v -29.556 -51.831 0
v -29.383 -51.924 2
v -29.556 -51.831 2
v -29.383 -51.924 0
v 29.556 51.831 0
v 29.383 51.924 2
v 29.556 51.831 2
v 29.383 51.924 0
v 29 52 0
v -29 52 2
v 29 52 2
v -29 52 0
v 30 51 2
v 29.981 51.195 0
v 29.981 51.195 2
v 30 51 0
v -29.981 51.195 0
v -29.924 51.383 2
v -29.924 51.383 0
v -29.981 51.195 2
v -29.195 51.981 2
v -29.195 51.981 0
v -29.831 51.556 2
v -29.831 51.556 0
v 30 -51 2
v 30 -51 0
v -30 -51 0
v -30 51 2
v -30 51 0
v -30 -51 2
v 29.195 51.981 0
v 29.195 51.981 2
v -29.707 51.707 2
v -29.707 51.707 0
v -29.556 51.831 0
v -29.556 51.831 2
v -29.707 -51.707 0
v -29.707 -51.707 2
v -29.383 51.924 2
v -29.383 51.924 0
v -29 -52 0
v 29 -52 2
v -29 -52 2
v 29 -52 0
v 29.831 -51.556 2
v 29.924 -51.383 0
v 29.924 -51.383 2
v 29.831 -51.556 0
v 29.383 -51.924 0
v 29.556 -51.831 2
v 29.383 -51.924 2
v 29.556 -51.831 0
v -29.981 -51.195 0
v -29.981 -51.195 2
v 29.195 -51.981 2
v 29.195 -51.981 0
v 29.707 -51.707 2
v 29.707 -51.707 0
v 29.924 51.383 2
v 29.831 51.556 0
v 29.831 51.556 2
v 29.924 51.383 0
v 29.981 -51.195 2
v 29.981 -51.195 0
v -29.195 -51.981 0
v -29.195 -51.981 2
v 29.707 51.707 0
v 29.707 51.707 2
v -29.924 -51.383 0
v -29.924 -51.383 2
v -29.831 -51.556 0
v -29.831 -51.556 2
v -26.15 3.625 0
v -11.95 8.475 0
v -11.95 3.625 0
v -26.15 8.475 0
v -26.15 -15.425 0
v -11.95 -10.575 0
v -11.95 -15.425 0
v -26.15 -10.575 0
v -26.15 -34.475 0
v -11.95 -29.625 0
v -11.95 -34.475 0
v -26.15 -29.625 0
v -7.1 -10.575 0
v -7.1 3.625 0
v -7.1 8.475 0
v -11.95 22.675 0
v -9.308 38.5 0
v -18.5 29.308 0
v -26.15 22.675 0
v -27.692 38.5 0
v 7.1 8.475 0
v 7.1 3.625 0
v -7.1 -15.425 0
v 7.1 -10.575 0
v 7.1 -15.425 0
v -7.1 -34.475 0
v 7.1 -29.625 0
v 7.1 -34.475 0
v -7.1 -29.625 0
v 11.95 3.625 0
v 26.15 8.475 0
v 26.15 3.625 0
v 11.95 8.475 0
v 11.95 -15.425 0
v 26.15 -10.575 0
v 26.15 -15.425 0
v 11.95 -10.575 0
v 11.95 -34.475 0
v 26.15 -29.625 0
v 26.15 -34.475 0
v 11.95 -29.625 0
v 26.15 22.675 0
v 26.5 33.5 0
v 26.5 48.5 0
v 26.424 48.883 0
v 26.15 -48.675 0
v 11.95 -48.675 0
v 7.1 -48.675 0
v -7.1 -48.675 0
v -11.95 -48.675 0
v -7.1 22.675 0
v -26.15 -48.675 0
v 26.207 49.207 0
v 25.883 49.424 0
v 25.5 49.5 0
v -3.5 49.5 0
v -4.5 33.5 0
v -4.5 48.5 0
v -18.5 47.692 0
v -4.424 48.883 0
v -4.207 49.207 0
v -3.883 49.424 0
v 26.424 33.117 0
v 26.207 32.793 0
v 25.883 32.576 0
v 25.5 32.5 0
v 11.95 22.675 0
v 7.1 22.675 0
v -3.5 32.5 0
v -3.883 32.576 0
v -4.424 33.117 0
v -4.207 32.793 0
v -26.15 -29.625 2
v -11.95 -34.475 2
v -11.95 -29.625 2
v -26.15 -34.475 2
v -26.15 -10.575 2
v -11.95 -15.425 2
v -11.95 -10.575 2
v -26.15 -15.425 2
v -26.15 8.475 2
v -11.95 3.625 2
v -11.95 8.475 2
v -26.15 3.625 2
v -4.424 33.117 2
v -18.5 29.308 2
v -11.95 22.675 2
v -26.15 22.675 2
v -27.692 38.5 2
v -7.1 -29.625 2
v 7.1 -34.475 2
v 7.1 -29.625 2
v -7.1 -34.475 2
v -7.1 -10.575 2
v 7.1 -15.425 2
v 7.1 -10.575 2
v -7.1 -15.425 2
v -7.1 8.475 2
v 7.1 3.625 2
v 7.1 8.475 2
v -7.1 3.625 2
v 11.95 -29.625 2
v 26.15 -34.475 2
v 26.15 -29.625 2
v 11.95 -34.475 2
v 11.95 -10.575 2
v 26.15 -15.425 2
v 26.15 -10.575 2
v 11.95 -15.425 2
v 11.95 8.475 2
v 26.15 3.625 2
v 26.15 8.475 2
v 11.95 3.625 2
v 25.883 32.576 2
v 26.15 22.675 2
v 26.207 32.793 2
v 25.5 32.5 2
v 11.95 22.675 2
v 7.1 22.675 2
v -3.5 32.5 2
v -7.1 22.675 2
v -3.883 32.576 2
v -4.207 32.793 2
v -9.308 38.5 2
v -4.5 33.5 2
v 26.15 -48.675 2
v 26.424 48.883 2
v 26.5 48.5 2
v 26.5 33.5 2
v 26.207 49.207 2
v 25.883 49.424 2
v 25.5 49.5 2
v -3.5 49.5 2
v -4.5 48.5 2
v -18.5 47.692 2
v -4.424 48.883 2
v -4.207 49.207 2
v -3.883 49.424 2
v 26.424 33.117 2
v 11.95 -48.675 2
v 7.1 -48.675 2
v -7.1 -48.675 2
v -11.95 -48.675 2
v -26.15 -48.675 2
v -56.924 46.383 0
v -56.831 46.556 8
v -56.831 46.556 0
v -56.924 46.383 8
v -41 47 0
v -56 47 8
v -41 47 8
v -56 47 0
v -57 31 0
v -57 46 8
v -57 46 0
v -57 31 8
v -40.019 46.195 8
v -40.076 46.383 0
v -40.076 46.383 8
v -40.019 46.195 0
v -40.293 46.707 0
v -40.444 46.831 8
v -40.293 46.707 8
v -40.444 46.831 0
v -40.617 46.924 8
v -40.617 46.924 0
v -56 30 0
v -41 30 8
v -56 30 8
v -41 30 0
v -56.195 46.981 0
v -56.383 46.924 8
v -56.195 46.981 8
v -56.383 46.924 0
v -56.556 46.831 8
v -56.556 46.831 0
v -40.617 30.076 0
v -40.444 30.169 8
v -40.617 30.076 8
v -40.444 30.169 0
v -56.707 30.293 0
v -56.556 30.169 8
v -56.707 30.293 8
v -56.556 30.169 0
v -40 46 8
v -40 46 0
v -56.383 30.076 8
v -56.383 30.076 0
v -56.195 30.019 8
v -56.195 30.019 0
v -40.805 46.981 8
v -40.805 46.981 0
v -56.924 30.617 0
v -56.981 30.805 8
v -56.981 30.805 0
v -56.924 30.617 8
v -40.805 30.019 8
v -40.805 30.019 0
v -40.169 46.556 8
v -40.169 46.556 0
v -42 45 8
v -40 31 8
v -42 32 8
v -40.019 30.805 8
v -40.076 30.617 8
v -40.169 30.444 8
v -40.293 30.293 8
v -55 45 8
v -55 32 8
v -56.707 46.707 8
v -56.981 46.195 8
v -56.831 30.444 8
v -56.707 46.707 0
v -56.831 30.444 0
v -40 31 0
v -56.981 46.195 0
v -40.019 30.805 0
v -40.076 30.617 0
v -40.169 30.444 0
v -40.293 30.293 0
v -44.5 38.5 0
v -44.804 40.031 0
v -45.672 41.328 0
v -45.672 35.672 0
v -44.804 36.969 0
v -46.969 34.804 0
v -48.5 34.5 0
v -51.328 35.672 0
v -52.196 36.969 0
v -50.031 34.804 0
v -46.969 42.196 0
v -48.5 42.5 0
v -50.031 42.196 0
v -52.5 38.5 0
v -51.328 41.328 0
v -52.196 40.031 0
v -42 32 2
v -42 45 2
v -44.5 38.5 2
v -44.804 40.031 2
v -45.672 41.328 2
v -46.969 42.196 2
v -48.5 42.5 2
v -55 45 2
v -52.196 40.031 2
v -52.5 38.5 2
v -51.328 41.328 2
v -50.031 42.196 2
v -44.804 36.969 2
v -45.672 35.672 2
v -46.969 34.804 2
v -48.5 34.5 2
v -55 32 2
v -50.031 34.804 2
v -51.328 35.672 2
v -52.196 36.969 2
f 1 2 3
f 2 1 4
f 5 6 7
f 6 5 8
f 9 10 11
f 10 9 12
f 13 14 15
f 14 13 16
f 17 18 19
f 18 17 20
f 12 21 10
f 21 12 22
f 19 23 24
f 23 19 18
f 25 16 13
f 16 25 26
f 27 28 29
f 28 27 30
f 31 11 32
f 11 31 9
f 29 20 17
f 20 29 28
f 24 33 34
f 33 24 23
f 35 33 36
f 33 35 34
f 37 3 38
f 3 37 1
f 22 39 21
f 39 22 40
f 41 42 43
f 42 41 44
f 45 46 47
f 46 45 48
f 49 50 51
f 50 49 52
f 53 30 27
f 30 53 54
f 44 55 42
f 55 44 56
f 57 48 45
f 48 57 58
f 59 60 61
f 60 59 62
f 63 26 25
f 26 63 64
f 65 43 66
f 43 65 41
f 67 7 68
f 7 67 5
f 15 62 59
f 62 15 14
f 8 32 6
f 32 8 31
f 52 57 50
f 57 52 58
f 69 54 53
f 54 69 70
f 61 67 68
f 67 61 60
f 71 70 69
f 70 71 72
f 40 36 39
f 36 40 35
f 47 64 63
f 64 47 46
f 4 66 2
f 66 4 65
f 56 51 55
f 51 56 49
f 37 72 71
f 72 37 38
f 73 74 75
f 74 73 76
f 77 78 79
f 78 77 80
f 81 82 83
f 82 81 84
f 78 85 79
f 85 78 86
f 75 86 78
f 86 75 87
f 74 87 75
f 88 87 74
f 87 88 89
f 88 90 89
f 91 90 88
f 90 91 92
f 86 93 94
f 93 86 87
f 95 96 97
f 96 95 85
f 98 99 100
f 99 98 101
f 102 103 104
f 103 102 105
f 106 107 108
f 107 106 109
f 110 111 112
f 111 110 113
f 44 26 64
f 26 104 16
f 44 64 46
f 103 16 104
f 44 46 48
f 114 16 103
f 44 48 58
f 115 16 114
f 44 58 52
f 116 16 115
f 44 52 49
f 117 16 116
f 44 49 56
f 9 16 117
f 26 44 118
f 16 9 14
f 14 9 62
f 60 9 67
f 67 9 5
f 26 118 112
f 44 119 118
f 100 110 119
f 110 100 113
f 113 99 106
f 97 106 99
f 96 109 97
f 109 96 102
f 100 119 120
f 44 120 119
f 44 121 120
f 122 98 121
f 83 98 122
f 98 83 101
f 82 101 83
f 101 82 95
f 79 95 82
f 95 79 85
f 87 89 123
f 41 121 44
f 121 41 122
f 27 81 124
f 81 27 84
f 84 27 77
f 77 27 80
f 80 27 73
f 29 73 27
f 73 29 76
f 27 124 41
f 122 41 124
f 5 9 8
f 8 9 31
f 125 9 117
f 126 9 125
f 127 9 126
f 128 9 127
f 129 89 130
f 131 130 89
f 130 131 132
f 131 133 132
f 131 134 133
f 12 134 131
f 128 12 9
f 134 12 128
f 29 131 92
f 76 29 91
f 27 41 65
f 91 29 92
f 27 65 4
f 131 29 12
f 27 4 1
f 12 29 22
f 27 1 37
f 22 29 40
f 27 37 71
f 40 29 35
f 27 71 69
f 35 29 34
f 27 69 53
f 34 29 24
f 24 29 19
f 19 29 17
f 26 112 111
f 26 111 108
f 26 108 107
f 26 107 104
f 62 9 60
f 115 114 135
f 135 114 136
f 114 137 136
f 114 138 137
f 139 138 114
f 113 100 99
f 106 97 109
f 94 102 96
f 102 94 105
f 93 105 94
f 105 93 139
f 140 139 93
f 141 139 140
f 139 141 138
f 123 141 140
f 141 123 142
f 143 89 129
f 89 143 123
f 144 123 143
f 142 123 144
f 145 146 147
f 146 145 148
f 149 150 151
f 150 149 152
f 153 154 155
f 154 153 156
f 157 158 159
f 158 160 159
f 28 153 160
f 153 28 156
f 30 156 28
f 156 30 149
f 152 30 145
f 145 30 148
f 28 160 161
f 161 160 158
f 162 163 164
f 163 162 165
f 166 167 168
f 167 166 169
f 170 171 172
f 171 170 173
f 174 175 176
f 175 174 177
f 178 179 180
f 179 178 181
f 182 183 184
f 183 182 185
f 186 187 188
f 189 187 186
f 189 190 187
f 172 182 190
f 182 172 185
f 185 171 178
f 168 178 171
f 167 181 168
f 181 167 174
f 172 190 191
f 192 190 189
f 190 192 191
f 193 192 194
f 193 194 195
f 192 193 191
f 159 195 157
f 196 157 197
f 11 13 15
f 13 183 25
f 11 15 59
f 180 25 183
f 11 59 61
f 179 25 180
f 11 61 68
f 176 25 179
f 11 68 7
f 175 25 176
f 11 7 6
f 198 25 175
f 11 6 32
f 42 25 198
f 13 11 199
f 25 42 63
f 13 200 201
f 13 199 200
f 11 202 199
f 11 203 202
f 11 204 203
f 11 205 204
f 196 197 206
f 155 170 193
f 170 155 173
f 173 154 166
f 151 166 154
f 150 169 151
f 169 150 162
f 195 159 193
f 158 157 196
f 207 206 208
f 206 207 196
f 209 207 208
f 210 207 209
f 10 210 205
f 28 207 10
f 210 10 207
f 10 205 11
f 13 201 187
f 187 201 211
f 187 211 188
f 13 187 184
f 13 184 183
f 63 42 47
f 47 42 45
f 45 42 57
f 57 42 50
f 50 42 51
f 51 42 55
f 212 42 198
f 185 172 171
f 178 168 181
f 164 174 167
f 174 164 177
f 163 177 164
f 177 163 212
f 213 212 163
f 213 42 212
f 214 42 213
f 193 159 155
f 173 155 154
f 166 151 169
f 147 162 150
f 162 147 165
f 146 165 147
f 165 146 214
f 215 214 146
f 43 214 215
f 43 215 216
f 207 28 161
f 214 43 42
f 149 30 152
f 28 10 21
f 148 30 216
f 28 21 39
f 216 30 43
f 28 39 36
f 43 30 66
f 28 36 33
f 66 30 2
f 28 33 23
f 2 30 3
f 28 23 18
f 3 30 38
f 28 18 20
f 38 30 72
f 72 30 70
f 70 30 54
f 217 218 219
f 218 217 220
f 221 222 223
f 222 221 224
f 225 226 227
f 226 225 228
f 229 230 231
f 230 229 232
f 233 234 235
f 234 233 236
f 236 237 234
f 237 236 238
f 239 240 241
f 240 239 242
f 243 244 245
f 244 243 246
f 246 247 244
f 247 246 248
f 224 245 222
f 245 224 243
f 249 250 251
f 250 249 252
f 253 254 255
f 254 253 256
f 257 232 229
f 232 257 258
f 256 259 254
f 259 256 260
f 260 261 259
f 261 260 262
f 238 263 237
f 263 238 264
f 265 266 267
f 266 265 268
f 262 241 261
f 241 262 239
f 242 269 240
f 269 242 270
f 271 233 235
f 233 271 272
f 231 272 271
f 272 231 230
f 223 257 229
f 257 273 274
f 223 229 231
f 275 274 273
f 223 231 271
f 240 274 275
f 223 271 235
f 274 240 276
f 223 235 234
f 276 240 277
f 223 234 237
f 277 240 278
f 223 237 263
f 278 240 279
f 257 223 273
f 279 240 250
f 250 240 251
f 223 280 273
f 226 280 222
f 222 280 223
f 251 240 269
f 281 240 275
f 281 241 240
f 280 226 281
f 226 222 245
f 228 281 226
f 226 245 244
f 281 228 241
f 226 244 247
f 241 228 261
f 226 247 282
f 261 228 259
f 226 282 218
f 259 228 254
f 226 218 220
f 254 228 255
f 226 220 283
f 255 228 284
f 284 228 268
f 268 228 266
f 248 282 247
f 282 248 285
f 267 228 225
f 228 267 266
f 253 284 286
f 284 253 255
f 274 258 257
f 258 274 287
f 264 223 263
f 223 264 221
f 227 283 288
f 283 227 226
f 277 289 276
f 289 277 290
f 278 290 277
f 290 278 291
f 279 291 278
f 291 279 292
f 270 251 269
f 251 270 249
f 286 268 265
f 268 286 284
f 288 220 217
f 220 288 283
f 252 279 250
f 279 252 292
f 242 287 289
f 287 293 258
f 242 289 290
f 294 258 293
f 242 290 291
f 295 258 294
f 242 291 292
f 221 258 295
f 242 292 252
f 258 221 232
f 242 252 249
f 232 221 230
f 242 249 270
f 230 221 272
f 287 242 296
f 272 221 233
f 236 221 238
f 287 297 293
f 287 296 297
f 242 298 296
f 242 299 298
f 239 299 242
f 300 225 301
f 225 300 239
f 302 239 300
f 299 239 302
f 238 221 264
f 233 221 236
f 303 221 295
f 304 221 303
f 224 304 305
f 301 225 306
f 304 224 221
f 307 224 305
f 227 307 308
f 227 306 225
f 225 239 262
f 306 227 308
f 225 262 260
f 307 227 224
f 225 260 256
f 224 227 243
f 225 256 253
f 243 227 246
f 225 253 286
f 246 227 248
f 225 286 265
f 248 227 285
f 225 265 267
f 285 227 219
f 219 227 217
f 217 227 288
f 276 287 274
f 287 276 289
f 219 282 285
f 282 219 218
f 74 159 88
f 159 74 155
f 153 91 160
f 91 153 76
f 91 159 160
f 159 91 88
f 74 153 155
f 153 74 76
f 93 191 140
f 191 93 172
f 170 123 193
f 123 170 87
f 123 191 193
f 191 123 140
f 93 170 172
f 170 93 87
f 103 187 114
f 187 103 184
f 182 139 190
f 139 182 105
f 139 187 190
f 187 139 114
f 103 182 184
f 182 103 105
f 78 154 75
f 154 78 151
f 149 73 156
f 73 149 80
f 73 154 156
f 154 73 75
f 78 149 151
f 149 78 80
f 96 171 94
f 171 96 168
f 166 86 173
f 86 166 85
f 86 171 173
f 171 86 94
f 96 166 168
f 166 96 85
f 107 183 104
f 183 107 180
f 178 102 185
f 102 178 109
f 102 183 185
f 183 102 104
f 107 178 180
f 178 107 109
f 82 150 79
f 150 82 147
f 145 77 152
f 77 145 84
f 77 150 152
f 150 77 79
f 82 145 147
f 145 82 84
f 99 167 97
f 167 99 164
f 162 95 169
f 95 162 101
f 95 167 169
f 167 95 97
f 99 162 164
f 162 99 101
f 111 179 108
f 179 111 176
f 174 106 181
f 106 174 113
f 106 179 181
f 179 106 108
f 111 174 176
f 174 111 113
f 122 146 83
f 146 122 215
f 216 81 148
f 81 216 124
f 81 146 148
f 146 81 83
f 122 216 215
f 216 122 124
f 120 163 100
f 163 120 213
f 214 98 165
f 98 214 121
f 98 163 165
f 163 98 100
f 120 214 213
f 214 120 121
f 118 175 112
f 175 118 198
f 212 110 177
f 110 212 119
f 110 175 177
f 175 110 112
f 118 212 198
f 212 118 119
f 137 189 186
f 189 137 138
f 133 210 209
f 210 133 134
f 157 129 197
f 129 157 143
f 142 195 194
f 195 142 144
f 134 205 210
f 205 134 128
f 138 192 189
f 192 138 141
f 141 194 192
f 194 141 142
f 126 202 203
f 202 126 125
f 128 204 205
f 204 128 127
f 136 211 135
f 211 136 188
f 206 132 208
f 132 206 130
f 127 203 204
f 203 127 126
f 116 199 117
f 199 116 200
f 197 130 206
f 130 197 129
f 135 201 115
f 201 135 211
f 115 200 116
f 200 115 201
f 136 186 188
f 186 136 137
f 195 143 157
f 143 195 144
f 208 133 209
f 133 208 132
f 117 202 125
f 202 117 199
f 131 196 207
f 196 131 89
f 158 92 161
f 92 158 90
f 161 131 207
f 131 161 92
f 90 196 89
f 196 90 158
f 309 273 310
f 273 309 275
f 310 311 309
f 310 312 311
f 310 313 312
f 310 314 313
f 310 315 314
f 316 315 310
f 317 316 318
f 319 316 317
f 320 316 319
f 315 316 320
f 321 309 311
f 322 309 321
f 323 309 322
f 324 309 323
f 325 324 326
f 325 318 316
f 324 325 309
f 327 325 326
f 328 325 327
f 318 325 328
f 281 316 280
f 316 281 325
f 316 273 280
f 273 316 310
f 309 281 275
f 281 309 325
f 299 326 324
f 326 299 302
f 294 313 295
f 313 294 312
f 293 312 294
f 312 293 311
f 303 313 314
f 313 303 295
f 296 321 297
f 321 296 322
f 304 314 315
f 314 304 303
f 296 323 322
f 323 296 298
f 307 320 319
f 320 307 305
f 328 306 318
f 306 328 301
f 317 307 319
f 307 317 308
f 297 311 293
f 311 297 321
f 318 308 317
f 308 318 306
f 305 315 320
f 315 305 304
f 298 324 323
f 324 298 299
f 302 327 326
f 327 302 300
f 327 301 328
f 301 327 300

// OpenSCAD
// MacroPad RP2040 Top Cover
// Parametric design for Adafruit MacroPad RP2040 keyboard controller
// Author: Generated for CircuitPython EVM Controller project
// License: MIT

// Cheatsheet: https://openscad.org/cheatsheet/index.html?version=2021.01

// This file is the design for the top cover of a case designed to enclose the 
// Adafruit MacroPad RP2040 hardware module. Tve cover comtains 12 holes for the 
// key switches. The holes are sized to enssure a tight fit for the keys switches
// Key swiicthes are carefully inserted through the top cover holes, the looser
// fitting filler layer in to the keys switches sockes that Adafruit has soldered
// into the board. The cover also completely encloses the Encoder on the PCB.
// The encoder nut and washer is to be removed during assembly and added back
// on top of the shaft cover and used to secure the top cover to the PCB board. 

// =============================================================================
// PARAMETERS
// =============================================================================

// RP2040 PCB parameters
pcb_length = 105;          // RP2040 PCB length (mm)
pcb_width = 60;            // RP2040 PCB width (mm)
pcb_thickness = 1.6;       // Standard PCB thickness (mm)
pcb_clearance = 1;         // Space around PCB (mm)
pcb_height_clearance = 8;  // Space above PCB for components (mm)

// Overall cover dimensions
cover_length = 105 - 1;   // Total length of cover (mm)  
cover_width = 60;         // Total width of cover (mm)
cover_thickness = 2;       // Thickness of top plate (mm)
corner_radius = 1;         // Rounded corner radius (mm)

// Key switch parameters (Cherry MX compatible)
key_switch_size = 14;      // Square hole size for key switches (mm)
key_switch_spacing = 19.05; // Center-to-center spacing (0.75" standard)
key_rows = 4;              // Number of rows
key_cols = 3;              // Number of columns

// Key switch grid positioning (relative to cover center)
keys_offset_x = 0;         // X offset of key grid center
keys_offset_y = -13;     // Y offset of key grid center (negative = toward bottom)

// LCD/OLED display parameters
lcd_width = 31;            // Width of LCD cutout (mm)
lcd_height = 17;           // Height of LCD cutout (mm)
lcd_corner_radius = 1;     // Corner radius for LCD hole
//lcd_offset_x = -11;        // X position relative to center
lcd_offset_x = 11;        // X position relative to center
lcd_offset_y = 41;         // Y position relative to center (positive = toward top)

// Cover base Encoder hole
encoder_hole_size = 13;         // Square hole size for encoder + 1 mm space(mm)
encoder_hole_offset_x = -18.5;   // Hole X position relative to center
encoder_hole_offset_y = 38.5;   // Hole Y position relative to center
encoder_hole_z = 5;             // Hole encoder shaft height

// Rotary encoder parameters and relative to shaft center
encoder_shaft_diameter = 6;
encoder_size = 13;         // Square hole size for encoder + 1 mm space(mm)
//encoder_offset_x = 18.5;   // X position relative to center
encoder_offset_x = -48.5;   // X position relative to center
encoder_offset_y = 38.5;   // Y position relative to center
encoder_shaft_z = 8;      // Encoder shaft height
encoder_shaft_clearance = 2; // General clearance for 3D printing (mm)

shaft_wall_width= 2;       // 
shaft_corner_radius = 1;   // Corner radius for encoder hole

// Mounting and clearance
wall_thickness = 2;        // Wall thickness for sides (if adding later)
clearance = 0.2;           // General clearance for 3D printing (mm)

// =============================================================================
// MAIN OBJECT
// =============================================================================

difference() {
        
    // Base cover plate
    base_cover();
    
    // Cut out holes for key switches
    key_switch_holes();
    
    // Cut out hole for LCD/OLED
    lcd_hole();
    
    base_encoder_hole();

    // Cut out hole for rotary encoder
    encoder_shaft_hole();                        

    // Cut out encoder shaft hole
    encoder_round_hole();
        
}

// Optional: Show key switch positions for reference (comment out for final print)
// %key_switch_positions(); // The % makes it transparent/reference only

// =============================================================================
// MODULES (Functions)
// =============================================================================

// Create the base cover plate with rounded corners
module base_cover() {
    
    union() {
        // Using hull() with corner cylinders to create rounded rectangle
        hull() {
            // Four corner cylinders to create rounded rectangle
            translate([-(cover_width/2 - corner_radius), -(cover_length/2 - corner_radius), 0])
                cylinder(h = cover_thickness, r = corner_radius, $fn = 32);
            
            translate([+(cover_width/2 - corner_radius), -(cover_length/2 - corner_radius), 0])
                cylinder(h = cover_thickness, r = corner_radius, $fn = 32);
            
            translate([+(cover_width/2 - corner_radius), +(cover_length/2 - corner_radius), 0])
                cylinder(h = cover_thickness, r = corner_radius, $fn = 32);
            
            translate([-(cover_width/2 - corner_radius), +(cover_length/2 - corner_radius), 0])
                cylinder(h = cover_thickness, r = corner_radius, $fn = 32);
        }
        
        // Wrap the open encoder shaft
        encoder_shaft_wrap();                        
    }
}

// Create all key switch holes in a 3x4 matrix
module key_switch_holes() {
    // Calculate starting position for grid (top-left key)
    start_x = keys_offset_x - (key_switch_spacing * (key_cols - 1) / 2);
    start_y = keys_offset_y + (key_switch_spacing * (key_rows - 1) / 2);
    
    // Create grid of holes
    for (row = [0 : key_rows - 1]) {
        for (col = [0 : key_cols - 1]) {
            translate([
                start_x + (col * key_switch_spacing),
                start_y - (row * key_switch_spacing),
                -0.5  // Extend slightly below surface for clean cut
            ]) {
                // Square hole for key switch
                cube([
                    key_switch_size + clearance,
                    key_switch_size + clearance,
                    cover_thickness + 5
                ], center = true);
            }
        }
    }
}

// Create LCD/OLED display hole
module lcd_hole() {
    translate([lcd_offset_x, lcd_offset_y, -0.5]) {
        // Rounded rectangle hole for LCD
        hull() {
            // Four corner cylinders for rounded rectangle
            translate([-(lcd_width/2 - lcd_corner_radius), -(lcd_height/2 - lcd_corner_radius), 0])
                cylinder(h = cover_thickness + 1, r = lcd_corner_radius, $fn = 16);
            
            translate([+(lcd_width/2 - lcd_corner_radius), -(lcd_height/2 - lcd_corner_radius), 0])
                cylinder(h = cover_thickness + 1, r = lcd_corner_radius, $fn = 16);
            
            translate([+(lcd_width/2 - lcd_corner_radius), +(lcd_height/2 - lcd_corner_radius), 0])
                cylinder(h = cover_thickness + 1, r = lcd_corner_radius, $fn = 16);
            
            translate([-(lcd_width/2 - lcd_corner_radius), +(lcd_height/2 - lcd_corner_radius), 0])
                cylinder(h = cover_thickness + 1, r = lcd_corner_radius, $fn = 16);
        }
    }
}


// Reference module to show key switch positions (for design verification)
module key_switch_positions() {
    // Calculate starting position for grid
    start_x = keys_offset_x - (key_switch_spacing * (key_cols - 1) / 2);
    start_y = keys_offset_y + (key_switch_spacing * (key_rows - 1) / 2);
    
    // Show key positions with small cylinders
    for (row = [0 : key_rows - 1]) {
        for (col = [0 : key_cols - 1]) {
            translate([
                start_x + (col * key_switch_spacing),
                start_y - (row * key_switch_spacing),
                cover_thickness
            ]) {
                cylinder(h = 2, r = 1, $fn = 8);
                
                // Optional: Add text labels for key numbers
                translate([0, 0, 2]) {
                    linear_extrude(height = 0.5) {
                        text(
                            str(row * key_cols + col), 
                            size = 3, 
                            halign = "center", 
                            valign = "center"
                        );
                    }
                }
            }
        }
    }
}

// Encoder hole in cover base
module base_encoder_hole() {
    
    color("blue") translate([encoder_hole_offset_x, encoder_hole_offset_y, -0.5]) {
        // Square hole with slightly rounded corners for encoder
        rotate(45) 
        cube([encoder_hole_size,encoder_hole_size, 10],center = true);
    }    
}



// Seperated: Create rotary encoder hole through cover base and shaft cibe
module encoder_shaft_wrap() {
    
    encoder_z = encoder_shaft_z - shaft_wall_width;  // 2mm Shaft top cover
    
    translate([encoder_offset_x, encoder_offset_y, 0]) {
        // Square hole with slightly rounded corners for encoder
        hull() {
            // Four corner cylinders for rounded square
            translate([+(encoder_size/2 + shaft_wall_width - shaft_corner_radius), -(encoder_size/2 + shaft_wall_width - shaft_corner_radius), 0])
                cylinder(h = cover_thickness + encoder_z, r = shaft_corner_radius, $fn = 32);
            
            translate([-(encoder_size/2 + shaft_wall_width - shaft_corner_radius), -(encoder_size/2 + shaft_wall_width - shaft_corner_radius), 0])
                cylinder(h = cover_thickness + encoder_z, r = shaft_corner_radius, $fn = 32);
            
            translate([+(encoder_size/2 + shaft_wall_width - shaft_corner_radius), (encoder_size/2 + shaft_wall_width - shaft_corner_radius), 0])
                cylinder(h = cover_thickness + encoder_z, r = shaft_corner_radius, $fn = 32);
            
            translate([-(encoder_size/2 + shaft_wall_width - shaft_corner_radius), (encoder_size/2 + shaft_wall_width - shaft_corner_radius), 0])
                cylinder(h = cover_thickness + encoder_z, r = shaft_corner_radius, $fn = 32);
        }
    }
}


// Seperated: Create a wrapper around encoder sides starting at cover height
module encoder_shaft_hole() {
    encoder_z = encoder_shaft_z + shaft_wall_width;  // 2mm Shaft top cover
    
    color("red") translate([encoder_offset_x, encoder_offset_y, encoder_z / 2 + 2]) {
        // Square hole with slightly rounded corners for encoder 
        cube([encoder_size,encoder_size, encoder_z],center = true);
    }    
}

// Seperated: Create Encoder 6mm Shaft through hole
module encoder_round_hole() {
    color("blue") translate([encoder_offset_x, encoder_offset_y, -0.5]) {
        // Through hole for encoder shaft
        cylinder(
            h = encoder_shaft_z + 2, 
            d = encoder_shaft_diameter + encoder_shaft_clearance, 
            $fn = 16
        );        
    }
}
